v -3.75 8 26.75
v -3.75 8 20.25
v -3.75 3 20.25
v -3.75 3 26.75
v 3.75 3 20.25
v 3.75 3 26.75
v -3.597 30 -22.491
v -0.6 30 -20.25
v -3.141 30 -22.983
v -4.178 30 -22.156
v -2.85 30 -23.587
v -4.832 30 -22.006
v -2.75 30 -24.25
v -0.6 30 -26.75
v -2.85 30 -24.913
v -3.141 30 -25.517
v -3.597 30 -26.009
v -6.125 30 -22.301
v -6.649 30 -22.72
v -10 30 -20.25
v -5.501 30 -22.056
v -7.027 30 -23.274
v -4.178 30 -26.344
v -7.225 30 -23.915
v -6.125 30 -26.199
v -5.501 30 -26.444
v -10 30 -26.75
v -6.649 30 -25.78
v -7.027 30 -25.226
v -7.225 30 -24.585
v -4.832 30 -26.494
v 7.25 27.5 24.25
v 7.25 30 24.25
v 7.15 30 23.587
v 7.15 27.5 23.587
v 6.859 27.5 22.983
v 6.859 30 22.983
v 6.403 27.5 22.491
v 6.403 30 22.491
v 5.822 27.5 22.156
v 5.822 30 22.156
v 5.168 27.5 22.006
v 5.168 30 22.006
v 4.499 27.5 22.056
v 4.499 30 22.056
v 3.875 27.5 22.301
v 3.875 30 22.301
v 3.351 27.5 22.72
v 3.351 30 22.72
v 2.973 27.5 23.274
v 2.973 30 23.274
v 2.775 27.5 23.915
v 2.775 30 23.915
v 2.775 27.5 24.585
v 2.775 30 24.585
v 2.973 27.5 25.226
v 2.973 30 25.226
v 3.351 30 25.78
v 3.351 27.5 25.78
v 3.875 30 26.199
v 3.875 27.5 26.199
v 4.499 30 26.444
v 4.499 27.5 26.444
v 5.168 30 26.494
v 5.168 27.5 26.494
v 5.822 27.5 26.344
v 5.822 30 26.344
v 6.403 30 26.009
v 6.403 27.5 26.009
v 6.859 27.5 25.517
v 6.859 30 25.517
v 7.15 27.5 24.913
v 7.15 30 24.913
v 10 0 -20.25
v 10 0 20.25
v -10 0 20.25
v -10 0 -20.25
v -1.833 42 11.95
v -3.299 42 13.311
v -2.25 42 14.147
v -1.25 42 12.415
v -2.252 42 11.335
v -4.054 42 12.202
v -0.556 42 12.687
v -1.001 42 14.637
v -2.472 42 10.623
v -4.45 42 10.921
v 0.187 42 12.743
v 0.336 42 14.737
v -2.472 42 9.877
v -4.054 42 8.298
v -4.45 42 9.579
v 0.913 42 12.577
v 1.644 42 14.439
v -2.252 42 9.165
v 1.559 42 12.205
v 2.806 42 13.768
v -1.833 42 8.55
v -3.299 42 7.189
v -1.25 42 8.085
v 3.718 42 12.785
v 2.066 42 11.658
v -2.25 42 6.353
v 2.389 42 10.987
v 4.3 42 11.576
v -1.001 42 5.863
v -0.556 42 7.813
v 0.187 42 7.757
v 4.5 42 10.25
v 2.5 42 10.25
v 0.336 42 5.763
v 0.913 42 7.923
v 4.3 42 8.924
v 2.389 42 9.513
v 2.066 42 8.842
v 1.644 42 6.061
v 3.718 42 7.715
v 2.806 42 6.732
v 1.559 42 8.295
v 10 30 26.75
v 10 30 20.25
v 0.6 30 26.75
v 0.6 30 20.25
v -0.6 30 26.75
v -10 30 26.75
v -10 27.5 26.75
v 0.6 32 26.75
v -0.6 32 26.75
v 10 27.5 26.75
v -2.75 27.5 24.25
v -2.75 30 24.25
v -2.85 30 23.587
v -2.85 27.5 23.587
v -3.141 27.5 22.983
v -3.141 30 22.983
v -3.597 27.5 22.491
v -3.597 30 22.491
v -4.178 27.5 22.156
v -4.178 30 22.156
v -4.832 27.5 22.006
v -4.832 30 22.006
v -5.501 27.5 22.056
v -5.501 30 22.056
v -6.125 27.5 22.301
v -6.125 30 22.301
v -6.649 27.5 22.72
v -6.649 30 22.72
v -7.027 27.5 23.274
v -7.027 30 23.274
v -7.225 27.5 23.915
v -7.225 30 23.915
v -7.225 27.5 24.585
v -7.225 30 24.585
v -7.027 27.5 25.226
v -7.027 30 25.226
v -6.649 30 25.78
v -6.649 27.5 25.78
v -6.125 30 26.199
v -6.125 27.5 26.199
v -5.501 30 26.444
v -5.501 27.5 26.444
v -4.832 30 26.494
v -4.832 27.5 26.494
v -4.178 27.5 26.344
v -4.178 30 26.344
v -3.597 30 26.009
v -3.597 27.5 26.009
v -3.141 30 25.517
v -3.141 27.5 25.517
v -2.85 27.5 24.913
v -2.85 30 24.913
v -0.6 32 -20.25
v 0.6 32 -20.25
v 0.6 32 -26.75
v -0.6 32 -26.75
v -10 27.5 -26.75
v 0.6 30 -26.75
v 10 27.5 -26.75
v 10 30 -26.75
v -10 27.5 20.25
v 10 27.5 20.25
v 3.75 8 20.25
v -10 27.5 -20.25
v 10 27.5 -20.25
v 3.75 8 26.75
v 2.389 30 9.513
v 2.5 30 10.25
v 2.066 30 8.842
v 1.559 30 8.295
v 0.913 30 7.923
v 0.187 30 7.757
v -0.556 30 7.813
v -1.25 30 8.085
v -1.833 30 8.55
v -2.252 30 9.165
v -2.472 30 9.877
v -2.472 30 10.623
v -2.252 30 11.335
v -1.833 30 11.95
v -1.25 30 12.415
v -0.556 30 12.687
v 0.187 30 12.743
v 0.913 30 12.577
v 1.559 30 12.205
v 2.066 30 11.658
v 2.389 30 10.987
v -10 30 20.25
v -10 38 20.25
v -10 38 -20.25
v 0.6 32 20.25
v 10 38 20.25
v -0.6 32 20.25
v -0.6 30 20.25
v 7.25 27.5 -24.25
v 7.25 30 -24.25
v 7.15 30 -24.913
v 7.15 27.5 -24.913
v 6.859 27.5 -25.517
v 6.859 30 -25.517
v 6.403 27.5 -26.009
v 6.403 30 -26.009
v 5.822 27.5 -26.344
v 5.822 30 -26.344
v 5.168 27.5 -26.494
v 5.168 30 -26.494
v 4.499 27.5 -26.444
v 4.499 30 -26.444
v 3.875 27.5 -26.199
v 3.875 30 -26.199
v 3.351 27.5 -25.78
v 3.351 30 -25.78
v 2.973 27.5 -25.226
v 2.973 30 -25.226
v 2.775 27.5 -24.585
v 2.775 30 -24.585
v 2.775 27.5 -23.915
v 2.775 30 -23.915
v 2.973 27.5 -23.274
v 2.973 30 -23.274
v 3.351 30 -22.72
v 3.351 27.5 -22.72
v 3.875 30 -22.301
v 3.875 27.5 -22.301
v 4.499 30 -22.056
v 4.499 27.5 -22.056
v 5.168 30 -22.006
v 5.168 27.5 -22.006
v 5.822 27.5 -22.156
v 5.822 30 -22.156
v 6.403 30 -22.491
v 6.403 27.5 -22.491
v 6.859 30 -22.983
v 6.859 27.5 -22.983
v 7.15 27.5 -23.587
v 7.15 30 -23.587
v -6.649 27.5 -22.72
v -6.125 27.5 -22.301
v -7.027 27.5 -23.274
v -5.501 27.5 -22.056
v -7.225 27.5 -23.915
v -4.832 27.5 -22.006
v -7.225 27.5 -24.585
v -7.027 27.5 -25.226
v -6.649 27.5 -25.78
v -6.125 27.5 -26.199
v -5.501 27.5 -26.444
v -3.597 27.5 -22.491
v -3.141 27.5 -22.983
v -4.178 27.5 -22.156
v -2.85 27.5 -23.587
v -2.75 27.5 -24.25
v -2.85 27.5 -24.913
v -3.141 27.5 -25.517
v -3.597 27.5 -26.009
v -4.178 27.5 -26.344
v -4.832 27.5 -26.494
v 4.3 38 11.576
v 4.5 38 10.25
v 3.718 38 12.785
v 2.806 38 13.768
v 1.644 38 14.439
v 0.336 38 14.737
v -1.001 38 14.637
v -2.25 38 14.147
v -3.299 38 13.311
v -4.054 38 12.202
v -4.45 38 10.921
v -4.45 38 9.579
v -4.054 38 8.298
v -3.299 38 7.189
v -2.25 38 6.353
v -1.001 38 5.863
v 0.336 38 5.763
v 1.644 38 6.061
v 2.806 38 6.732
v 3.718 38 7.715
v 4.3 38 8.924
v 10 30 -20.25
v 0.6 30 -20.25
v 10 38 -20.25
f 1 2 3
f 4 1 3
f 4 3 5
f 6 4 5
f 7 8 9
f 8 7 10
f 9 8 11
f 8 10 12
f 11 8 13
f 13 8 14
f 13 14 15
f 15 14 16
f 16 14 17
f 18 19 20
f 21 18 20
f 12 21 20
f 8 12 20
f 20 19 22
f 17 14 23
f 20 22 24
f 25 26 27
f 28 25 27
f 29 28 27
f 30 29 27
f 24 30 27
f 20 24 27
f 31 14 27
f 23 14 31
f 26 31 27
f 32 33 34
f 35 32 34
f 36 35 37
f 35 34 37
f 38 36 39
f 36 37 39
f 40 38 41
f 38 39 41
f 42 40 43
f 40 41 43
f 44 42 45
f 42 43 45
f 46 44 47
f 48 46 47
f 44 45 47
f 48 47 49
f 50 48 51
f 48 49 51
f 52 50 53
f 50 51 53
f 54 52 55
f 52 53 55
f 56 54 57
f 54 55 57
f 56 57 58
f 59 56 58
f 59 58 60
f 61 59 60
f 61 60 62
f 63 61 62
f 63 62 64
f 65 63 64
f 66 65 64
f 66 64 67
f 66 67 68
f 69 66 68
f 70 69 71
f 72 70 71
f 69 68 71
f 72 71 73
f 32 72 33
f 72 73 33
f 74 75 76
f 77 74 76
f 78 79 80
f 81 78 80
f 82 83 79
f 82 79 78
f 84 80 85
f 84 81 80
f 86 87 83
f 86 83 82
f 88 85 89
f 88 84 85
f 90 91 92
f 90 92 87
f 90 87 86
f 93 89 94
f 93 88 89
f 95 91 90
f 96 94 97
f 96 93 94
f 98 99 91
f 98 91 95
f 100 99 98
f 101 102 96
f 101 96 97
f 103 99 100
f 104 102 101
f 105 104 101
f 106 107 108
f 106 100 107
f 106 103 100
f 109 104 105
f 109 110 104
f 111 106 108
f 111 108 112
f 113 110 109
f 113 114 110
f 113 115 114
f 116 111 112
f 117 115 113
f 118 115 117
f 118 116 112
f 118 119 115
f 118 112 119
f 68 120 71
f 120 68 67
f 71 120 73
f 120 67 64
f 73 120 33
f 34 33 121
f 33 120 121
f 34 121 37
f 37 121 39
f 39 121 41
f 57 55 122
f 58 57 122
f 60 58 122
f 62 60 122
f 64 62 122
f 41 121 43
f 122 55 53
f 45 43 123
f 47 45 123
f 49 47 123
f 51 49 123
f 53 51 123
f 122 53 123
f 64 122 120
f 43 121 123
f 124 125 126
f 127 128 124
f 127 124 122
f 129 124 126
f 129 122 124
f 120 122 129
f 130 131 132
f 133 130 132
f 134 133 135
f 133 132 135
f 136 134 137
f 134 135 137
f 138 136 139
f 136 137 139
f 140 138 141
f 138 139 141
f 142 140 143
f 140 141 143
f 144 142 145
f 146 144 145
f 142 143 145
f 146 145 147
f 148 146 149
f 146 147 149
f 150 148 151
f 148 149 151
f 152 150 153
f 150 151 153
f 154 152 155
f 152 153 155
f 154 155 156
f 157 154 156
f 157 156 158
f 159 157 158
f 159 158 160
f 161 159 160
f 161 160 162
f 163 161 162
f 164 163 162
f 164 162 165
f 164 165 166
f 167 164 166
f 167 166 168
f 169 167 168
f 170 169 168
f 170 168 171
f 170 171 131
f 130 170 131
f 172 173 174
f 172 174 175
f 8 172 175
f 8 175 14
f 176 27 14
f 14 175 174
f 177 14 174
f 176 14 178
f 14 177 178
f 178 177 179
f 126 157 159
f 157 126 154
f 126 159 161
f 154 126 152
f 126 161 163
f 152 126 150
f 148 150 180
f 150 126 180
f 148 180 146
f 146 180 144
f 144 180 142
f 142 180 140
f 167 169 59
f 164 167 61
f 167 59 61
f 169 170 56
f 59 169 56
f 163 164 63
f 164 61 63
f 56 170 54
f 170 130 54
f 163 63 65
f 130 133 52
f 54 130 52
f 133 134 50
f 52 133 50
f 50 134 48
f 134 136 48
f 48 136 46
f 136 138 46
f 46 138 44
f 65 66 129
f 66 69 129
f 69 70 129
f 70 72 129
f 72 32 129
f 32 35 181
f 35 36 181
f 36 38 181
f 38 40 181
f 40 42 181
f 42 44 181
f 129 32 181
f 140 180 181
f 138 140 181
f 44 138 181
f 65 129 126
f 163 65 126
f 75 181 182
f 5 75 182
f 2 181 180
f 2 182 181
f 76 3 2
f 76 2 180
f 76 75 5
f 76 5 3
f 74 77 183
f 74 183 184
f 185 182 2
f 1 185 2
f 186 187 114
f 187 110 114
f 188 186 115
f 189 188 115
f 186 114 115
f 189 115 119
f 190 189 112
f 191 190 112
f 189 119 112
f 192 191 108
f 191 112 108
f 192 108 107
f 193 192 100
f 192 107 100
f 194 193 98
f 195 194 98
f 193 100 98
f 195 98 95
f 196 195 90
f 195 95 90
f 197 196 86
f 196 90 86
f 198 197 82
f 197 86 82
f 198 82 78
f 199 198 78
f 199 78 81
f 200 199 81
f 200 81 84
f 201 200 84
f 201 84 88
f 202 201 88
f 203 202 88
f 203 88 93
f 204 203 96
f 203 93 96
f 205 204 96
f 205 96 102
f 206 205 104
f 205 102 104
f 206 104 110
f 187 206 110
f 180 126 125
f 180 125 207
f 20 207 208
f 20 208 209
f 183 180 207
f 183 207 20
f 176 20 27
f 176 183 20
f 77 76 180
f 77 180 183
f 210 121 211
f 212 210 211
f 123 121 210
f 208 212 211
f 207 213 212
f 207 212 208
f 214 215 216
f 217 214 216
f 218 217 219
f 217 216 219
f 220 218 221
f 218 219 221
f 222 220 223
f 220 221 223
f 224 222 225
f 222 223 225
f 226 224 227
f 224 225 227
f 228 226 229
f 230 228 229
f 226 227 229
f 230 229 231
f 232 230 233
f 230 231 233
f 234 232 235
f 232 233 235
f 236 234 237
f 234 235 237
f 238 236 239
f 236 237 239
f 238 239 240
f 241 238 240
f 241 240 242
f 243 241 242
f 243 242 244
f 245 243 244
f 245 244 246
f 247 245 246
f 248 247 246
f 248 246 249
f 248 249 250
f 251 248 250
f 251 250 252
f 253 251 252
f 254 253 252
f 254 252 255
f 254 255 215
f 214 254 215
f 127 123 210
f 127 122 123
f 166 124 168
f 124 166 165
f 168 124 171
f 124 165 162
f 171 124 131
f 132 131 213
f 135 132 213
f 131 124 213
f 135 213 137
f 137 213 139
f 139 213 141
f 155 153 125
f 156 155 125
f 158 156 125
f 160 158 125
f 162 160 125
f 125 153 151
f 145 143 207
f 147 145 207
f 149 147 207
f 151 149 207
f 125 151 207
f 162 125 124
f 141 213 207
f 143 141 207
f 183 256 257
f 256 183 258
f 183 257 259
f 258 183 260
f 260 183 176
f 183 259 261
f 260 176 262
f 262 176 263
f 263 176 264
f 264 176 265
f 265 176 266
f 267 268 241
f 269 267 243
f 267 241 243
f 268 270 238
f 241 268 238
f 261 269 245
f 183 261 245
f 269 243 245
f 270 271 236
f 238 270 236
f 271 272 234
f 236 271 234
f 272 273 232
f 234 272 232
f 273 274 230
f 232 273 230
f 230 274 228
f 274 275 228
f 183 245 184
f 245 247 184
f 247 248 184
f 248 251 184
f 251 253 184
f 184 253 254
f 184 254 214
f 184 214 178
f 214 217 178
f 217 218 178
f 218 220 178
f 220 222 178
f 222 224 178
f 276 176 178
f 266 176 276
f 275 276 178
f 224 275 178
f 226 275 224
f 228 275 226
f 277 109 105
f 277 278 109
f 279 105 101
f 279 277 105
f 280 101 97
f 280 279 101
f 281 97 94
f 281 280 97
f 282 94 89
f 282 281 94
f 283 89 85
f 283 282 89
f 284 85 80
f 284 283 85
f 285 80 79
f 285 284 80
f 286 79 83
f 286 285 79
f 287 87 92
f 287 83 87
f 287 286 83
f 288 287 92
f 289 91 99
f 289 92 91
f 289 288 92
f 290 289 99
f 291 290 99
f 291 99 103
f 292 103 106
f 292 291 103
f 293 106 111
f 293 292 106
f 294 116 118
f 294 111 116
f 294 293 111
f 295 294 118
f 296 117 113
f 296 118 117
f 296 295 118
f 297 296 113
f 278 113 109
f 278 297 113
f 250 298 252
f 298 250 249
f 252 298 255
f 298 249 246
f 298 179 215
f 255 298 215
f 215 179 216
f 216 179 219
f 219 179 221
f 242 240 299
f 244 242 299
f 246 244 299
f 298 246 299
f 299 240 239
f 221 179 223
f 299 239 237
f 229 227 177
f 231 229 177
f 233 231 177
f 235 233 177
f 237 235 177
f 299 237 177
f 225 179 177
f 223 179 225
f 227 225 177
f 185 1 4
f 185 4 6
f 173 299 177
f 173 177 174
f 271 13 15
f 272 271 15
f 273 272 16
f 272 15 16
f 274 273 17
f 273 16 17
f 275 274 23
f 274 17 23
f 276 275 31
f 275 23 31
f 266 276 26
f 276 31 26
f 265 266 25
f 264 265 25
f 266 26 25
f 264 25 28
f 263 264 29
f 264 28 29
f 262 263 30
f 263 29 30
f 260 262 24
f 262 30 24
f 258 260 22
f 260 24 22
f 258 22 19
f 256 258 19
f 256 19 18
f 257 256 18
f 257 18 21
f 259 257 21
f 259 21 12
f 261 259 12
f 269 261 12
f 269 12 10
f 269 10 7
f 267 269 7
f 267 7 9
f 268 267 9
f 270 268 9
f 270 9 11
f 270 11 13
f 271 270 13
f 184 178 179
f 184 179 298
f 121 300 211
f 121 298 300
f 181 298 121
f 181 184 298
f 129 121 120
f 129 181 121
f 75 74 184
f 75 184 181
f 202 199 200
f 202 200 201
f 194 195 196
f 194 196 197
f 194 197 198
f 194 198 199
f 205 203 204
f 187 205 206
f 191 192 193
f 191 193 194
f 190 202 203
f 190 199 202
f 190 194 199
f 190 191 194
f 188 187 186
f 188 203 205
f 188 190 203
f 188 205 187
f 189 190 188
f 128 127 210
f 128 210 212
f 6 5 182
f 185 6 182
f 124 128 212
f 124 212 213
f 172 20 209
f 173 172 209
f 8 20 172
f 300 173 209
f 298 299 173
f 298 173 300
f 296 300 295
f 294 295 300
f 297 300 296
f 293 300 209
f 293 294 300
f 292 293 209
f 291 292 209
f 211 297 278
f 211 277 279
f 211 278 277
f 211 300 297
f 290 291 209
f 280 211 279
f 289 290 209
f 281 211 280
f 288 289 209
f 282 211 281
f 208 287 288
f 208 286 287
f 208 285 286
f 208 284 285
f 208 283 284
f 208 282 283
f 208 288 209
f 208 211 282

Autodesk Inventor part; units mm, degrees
ref_plane "YZ Plane" through (0, 0, 0) normal (1, 0, 0) x (0, 1, 0)
ref_plane "XZ Plane" through (0, 0, 0) normal (0, 1, 0) x (-1, 0, 0)
ref_plane "XY Plane" through (0, 0, 0) normal (0, 0, 1) x (1, 0, 0)
sketch "Sketch1" plane through (0, 0, 0) normal (0, 1, 0) x (-1, 0, 0)
  line L0 (-10, 20.25) -> (10, 20.25)
  line L1 (10, 20.25) -> (10, -20.25)
  line L2 (10, -20.25) -> (-10, -20.25)
  line L3 (-10, -20.25) -> (-10, 20.25)
  point P0 (0, 0)
  point P1 (0, 20.25)
  point P2 (10, 0)
  dimension "s_width" = 40.5
  dimension "s_depth" = 20
extrude "Extrusion1" add sketch "Sketch1" along normal blind 38
sketch "Sketch2" plane through (-10, 0, 20.25) normal (0, 0, 1) x (1, 0, 0)
  line L0 (0, 38) -> (20, 38) construction
  line L1 (10, 38) -> (10, 0) construction
  line L2 (0, 27.5) -> (20, 27.5)
  line L3 (20, 27.5) -> (20, 30)
  line L4 (20, 30) -> (0, 30)
  line L5 (0, 30) -> (0, 27.5)
  dimension "s_land_thickness" = 2.5
  dimension "s_land_dist_top" = 8
extrude "Extrusion2" add sketch "Sketch2" along normal blind 6.5 and the other way blind 47
sketch "Sketch3" plane through (-10, 30, 20.25) normal (0, 1, 0) x (1, 0, 0)
  line L0 (0, -6.5) -> (0, 0) construction
  line L1 (20, 0) -> (20, -6.5) construction
  circle A0 centre (5, -4) radius 2.25
  line L2 (0, -4) -> (20, -4) construction
  line L3 (20, -6.5) -> (0, -6.5) projected
  line L4 (0, 47) -> (0, 40.5) construction
  line L5 (0, 44.5) -> (20, 44.5) construction
  line L6 (20, 47) -> (20, 40.5) construction
  line L7 (0, 47) -> (20, 47) projected
  circle A1 centre (15, 44.5) radius 2.25
  circle A2 centre (15, -4) radius 2.25
  circle A3 centre (5, 44.5) radius 2.25
  point P0 (10, 20.25)
  dimension "s_hole_dia" = 4.5
  dimension "s_hole_front_dist" = 2.5
  dimension "d13" = 2.5
  dimension "s_hole_side_dist" = 2.75
  dimension "d42" = 2.75
extrude "Extrusion3" cut sketch "Sketch3" against normal up to next
sketch "Sketch4" plane through (-10, 0, 20.25) normal (0, 0, 1) x (1, 0, 0)
  line L0 (6.25, 3) -> (13.75, 3)
  line L1 (13.75, 3) -> (13.75, 8)
  line L2 (13.75, 8) -> (6.25, 8)
  line L3 (6.25, 8) -> (6.25, 3)
  line L4 (10, 0) -> (10, 27.5) construction
  line L5 (20, 27.5) -> (0, 27.5) construction
  line L6 (20, 0) -> (0, 0) construction
  point P0 (10, 8)
  dimension "s_cable_height" = 5
  dimension "s_cable_width" = 7.5
  dimension "s_cable_dist_bottom" = 3
extrude "Extrusion4" add sketch "Sketch4" along normal blind 6.5
sketch "Sketch5" plane through (-10, 38, 20.25) normal (0, 0, 1) x (1, 0, 0)
  line L0 (0, 0) -> (20, 0) construction
  line L1 (10, 0) -> (10, -8) construction
  line L2 (0, -8) -> (20, -8) construction
  line L3 (0, -8) -> (0, 0) construction
  line L4 (0, -4) -> (20, -4) construction
  line L5 (20, -8) -> (20, 0) construction
  line L6 (9.4, -8) -> (10.6, -8)
  line L7 (10.6, -8) -> (10.6, -6)
  line L8 (10.6, -6) -> (9.4, -6)
  line L9 (9.4, -6) -> (9.4, -8)
  line L10 (20, -8) -> (0, -8) projected
  point P0 (10, -38)
  dimension "s_land_pin_thickness" = 2
  dimension "d27" = 1.2
extrude "Extrusion5" add sketch "Sketch5" against normal up to surface (53.5 mm away) from surface at 6.5
sketch "Sketch6" plane through (0, 38, 0) normal (0, 1, 0) x (1, 0, 0)
  circle A0 centre (0, -10.25) radius 4.5
  line L0 (0, 0) -> (0, -26.75) construction
  line L1 (-10, -26.75) -> (10, -26.75) construction
  line L2 (10, 20.25) -> (-10, 20.25) projected
  line L3 (-10, -20.25) -> (10, -20.25) projected
  dimension "s_shaft_dia" = 9
  dimension "s_shaft_front_dist" = 10
extrude "Extrusion6" add sketch "Sketch6" along normal blind 4
sketch "Sketch8" plane through (0, 42, 10.25) normal (0, 1, 0) x (1, 0, 0)
  circle A0 centre (0, 0) radius 2.5
  circle A1 centre (0, 0) radius 4.5 construction
  point P0 (0, 10.25)
  dimension "d39" = 5
extrude "Extrusion8" cut sketch "Sketch8" against normal blind 12
equation "\"s_width\" = servo_width"
equation "\"s_depth\" = servo_depth"
equation "\"s_height\" = servo_height"
equation "\"s_land_dist_top\" = servo_mount_dist_top"
equation "\"s_land\" = servo_mount_length"
equation "\"d7\" = s_land + s_width"
equation "\"s_hole_dia\" = servo_mount_hole_diameter"
equation "\"s_hole_front_dist\" = servo_mount_hole_front_distance"
equation "\"d13\" = s_hole_front_dist"
equation "\"s_hole_side_dist\" = servo_mount_hole_side_distance"
equation "\"d42\" = s_hole_side_dist"
equation "\"s_cable_height\" = servo_cable_heigth"
equation "\"s_cable_width\" = servo_cable_width"
equation "\"s_cable_dist_bottom\" = servo_cable_distance_bottom"
equation "\"d24\" = servo_cable_length"
equation "\"s_land_pin_thickness\" = servo_mount_pin_height"
equation "\"d27\" = servo_mount_pin_thickness"
equation "\"s_shaft_front_dist\" = servo_shaft_front_distance"
equation "\"s_shaft_height\" = servo_shaft_height"
equation "\"servo_depth\" = 20"
equation "\"servo_height\" = 38"
equation "\"servo_width\" = 40.5"
equation "\"servo_mount_length\" = 6.5"
equation "\"servo_mount_hole_diameter\" = 4.5"
equation "\"servo_mount_hole_front_distance\" = 2.5"
equation "\"servo_mount_hole_side_distance\" = 2.75"
equation "\"servo_mount_pin_thickness\" = 1.2"
equation "\"servo_mount_pin_height\" = 2"
equation "\"servo_shaft_height\" = 4"
equation "\"servo_mount_dist_top\" = 8"
equation "\"servo_shaft_front_distance\" = 10"
equation "\"servo_cable_width\" = 7.5"
equation "\"servo_cable_length\" = 6.5"
equation "\"servo_cable_distance_bottom\" = 3"
equation "\"servo_cable_heigth\" = 5"
properties part number "Servo"
